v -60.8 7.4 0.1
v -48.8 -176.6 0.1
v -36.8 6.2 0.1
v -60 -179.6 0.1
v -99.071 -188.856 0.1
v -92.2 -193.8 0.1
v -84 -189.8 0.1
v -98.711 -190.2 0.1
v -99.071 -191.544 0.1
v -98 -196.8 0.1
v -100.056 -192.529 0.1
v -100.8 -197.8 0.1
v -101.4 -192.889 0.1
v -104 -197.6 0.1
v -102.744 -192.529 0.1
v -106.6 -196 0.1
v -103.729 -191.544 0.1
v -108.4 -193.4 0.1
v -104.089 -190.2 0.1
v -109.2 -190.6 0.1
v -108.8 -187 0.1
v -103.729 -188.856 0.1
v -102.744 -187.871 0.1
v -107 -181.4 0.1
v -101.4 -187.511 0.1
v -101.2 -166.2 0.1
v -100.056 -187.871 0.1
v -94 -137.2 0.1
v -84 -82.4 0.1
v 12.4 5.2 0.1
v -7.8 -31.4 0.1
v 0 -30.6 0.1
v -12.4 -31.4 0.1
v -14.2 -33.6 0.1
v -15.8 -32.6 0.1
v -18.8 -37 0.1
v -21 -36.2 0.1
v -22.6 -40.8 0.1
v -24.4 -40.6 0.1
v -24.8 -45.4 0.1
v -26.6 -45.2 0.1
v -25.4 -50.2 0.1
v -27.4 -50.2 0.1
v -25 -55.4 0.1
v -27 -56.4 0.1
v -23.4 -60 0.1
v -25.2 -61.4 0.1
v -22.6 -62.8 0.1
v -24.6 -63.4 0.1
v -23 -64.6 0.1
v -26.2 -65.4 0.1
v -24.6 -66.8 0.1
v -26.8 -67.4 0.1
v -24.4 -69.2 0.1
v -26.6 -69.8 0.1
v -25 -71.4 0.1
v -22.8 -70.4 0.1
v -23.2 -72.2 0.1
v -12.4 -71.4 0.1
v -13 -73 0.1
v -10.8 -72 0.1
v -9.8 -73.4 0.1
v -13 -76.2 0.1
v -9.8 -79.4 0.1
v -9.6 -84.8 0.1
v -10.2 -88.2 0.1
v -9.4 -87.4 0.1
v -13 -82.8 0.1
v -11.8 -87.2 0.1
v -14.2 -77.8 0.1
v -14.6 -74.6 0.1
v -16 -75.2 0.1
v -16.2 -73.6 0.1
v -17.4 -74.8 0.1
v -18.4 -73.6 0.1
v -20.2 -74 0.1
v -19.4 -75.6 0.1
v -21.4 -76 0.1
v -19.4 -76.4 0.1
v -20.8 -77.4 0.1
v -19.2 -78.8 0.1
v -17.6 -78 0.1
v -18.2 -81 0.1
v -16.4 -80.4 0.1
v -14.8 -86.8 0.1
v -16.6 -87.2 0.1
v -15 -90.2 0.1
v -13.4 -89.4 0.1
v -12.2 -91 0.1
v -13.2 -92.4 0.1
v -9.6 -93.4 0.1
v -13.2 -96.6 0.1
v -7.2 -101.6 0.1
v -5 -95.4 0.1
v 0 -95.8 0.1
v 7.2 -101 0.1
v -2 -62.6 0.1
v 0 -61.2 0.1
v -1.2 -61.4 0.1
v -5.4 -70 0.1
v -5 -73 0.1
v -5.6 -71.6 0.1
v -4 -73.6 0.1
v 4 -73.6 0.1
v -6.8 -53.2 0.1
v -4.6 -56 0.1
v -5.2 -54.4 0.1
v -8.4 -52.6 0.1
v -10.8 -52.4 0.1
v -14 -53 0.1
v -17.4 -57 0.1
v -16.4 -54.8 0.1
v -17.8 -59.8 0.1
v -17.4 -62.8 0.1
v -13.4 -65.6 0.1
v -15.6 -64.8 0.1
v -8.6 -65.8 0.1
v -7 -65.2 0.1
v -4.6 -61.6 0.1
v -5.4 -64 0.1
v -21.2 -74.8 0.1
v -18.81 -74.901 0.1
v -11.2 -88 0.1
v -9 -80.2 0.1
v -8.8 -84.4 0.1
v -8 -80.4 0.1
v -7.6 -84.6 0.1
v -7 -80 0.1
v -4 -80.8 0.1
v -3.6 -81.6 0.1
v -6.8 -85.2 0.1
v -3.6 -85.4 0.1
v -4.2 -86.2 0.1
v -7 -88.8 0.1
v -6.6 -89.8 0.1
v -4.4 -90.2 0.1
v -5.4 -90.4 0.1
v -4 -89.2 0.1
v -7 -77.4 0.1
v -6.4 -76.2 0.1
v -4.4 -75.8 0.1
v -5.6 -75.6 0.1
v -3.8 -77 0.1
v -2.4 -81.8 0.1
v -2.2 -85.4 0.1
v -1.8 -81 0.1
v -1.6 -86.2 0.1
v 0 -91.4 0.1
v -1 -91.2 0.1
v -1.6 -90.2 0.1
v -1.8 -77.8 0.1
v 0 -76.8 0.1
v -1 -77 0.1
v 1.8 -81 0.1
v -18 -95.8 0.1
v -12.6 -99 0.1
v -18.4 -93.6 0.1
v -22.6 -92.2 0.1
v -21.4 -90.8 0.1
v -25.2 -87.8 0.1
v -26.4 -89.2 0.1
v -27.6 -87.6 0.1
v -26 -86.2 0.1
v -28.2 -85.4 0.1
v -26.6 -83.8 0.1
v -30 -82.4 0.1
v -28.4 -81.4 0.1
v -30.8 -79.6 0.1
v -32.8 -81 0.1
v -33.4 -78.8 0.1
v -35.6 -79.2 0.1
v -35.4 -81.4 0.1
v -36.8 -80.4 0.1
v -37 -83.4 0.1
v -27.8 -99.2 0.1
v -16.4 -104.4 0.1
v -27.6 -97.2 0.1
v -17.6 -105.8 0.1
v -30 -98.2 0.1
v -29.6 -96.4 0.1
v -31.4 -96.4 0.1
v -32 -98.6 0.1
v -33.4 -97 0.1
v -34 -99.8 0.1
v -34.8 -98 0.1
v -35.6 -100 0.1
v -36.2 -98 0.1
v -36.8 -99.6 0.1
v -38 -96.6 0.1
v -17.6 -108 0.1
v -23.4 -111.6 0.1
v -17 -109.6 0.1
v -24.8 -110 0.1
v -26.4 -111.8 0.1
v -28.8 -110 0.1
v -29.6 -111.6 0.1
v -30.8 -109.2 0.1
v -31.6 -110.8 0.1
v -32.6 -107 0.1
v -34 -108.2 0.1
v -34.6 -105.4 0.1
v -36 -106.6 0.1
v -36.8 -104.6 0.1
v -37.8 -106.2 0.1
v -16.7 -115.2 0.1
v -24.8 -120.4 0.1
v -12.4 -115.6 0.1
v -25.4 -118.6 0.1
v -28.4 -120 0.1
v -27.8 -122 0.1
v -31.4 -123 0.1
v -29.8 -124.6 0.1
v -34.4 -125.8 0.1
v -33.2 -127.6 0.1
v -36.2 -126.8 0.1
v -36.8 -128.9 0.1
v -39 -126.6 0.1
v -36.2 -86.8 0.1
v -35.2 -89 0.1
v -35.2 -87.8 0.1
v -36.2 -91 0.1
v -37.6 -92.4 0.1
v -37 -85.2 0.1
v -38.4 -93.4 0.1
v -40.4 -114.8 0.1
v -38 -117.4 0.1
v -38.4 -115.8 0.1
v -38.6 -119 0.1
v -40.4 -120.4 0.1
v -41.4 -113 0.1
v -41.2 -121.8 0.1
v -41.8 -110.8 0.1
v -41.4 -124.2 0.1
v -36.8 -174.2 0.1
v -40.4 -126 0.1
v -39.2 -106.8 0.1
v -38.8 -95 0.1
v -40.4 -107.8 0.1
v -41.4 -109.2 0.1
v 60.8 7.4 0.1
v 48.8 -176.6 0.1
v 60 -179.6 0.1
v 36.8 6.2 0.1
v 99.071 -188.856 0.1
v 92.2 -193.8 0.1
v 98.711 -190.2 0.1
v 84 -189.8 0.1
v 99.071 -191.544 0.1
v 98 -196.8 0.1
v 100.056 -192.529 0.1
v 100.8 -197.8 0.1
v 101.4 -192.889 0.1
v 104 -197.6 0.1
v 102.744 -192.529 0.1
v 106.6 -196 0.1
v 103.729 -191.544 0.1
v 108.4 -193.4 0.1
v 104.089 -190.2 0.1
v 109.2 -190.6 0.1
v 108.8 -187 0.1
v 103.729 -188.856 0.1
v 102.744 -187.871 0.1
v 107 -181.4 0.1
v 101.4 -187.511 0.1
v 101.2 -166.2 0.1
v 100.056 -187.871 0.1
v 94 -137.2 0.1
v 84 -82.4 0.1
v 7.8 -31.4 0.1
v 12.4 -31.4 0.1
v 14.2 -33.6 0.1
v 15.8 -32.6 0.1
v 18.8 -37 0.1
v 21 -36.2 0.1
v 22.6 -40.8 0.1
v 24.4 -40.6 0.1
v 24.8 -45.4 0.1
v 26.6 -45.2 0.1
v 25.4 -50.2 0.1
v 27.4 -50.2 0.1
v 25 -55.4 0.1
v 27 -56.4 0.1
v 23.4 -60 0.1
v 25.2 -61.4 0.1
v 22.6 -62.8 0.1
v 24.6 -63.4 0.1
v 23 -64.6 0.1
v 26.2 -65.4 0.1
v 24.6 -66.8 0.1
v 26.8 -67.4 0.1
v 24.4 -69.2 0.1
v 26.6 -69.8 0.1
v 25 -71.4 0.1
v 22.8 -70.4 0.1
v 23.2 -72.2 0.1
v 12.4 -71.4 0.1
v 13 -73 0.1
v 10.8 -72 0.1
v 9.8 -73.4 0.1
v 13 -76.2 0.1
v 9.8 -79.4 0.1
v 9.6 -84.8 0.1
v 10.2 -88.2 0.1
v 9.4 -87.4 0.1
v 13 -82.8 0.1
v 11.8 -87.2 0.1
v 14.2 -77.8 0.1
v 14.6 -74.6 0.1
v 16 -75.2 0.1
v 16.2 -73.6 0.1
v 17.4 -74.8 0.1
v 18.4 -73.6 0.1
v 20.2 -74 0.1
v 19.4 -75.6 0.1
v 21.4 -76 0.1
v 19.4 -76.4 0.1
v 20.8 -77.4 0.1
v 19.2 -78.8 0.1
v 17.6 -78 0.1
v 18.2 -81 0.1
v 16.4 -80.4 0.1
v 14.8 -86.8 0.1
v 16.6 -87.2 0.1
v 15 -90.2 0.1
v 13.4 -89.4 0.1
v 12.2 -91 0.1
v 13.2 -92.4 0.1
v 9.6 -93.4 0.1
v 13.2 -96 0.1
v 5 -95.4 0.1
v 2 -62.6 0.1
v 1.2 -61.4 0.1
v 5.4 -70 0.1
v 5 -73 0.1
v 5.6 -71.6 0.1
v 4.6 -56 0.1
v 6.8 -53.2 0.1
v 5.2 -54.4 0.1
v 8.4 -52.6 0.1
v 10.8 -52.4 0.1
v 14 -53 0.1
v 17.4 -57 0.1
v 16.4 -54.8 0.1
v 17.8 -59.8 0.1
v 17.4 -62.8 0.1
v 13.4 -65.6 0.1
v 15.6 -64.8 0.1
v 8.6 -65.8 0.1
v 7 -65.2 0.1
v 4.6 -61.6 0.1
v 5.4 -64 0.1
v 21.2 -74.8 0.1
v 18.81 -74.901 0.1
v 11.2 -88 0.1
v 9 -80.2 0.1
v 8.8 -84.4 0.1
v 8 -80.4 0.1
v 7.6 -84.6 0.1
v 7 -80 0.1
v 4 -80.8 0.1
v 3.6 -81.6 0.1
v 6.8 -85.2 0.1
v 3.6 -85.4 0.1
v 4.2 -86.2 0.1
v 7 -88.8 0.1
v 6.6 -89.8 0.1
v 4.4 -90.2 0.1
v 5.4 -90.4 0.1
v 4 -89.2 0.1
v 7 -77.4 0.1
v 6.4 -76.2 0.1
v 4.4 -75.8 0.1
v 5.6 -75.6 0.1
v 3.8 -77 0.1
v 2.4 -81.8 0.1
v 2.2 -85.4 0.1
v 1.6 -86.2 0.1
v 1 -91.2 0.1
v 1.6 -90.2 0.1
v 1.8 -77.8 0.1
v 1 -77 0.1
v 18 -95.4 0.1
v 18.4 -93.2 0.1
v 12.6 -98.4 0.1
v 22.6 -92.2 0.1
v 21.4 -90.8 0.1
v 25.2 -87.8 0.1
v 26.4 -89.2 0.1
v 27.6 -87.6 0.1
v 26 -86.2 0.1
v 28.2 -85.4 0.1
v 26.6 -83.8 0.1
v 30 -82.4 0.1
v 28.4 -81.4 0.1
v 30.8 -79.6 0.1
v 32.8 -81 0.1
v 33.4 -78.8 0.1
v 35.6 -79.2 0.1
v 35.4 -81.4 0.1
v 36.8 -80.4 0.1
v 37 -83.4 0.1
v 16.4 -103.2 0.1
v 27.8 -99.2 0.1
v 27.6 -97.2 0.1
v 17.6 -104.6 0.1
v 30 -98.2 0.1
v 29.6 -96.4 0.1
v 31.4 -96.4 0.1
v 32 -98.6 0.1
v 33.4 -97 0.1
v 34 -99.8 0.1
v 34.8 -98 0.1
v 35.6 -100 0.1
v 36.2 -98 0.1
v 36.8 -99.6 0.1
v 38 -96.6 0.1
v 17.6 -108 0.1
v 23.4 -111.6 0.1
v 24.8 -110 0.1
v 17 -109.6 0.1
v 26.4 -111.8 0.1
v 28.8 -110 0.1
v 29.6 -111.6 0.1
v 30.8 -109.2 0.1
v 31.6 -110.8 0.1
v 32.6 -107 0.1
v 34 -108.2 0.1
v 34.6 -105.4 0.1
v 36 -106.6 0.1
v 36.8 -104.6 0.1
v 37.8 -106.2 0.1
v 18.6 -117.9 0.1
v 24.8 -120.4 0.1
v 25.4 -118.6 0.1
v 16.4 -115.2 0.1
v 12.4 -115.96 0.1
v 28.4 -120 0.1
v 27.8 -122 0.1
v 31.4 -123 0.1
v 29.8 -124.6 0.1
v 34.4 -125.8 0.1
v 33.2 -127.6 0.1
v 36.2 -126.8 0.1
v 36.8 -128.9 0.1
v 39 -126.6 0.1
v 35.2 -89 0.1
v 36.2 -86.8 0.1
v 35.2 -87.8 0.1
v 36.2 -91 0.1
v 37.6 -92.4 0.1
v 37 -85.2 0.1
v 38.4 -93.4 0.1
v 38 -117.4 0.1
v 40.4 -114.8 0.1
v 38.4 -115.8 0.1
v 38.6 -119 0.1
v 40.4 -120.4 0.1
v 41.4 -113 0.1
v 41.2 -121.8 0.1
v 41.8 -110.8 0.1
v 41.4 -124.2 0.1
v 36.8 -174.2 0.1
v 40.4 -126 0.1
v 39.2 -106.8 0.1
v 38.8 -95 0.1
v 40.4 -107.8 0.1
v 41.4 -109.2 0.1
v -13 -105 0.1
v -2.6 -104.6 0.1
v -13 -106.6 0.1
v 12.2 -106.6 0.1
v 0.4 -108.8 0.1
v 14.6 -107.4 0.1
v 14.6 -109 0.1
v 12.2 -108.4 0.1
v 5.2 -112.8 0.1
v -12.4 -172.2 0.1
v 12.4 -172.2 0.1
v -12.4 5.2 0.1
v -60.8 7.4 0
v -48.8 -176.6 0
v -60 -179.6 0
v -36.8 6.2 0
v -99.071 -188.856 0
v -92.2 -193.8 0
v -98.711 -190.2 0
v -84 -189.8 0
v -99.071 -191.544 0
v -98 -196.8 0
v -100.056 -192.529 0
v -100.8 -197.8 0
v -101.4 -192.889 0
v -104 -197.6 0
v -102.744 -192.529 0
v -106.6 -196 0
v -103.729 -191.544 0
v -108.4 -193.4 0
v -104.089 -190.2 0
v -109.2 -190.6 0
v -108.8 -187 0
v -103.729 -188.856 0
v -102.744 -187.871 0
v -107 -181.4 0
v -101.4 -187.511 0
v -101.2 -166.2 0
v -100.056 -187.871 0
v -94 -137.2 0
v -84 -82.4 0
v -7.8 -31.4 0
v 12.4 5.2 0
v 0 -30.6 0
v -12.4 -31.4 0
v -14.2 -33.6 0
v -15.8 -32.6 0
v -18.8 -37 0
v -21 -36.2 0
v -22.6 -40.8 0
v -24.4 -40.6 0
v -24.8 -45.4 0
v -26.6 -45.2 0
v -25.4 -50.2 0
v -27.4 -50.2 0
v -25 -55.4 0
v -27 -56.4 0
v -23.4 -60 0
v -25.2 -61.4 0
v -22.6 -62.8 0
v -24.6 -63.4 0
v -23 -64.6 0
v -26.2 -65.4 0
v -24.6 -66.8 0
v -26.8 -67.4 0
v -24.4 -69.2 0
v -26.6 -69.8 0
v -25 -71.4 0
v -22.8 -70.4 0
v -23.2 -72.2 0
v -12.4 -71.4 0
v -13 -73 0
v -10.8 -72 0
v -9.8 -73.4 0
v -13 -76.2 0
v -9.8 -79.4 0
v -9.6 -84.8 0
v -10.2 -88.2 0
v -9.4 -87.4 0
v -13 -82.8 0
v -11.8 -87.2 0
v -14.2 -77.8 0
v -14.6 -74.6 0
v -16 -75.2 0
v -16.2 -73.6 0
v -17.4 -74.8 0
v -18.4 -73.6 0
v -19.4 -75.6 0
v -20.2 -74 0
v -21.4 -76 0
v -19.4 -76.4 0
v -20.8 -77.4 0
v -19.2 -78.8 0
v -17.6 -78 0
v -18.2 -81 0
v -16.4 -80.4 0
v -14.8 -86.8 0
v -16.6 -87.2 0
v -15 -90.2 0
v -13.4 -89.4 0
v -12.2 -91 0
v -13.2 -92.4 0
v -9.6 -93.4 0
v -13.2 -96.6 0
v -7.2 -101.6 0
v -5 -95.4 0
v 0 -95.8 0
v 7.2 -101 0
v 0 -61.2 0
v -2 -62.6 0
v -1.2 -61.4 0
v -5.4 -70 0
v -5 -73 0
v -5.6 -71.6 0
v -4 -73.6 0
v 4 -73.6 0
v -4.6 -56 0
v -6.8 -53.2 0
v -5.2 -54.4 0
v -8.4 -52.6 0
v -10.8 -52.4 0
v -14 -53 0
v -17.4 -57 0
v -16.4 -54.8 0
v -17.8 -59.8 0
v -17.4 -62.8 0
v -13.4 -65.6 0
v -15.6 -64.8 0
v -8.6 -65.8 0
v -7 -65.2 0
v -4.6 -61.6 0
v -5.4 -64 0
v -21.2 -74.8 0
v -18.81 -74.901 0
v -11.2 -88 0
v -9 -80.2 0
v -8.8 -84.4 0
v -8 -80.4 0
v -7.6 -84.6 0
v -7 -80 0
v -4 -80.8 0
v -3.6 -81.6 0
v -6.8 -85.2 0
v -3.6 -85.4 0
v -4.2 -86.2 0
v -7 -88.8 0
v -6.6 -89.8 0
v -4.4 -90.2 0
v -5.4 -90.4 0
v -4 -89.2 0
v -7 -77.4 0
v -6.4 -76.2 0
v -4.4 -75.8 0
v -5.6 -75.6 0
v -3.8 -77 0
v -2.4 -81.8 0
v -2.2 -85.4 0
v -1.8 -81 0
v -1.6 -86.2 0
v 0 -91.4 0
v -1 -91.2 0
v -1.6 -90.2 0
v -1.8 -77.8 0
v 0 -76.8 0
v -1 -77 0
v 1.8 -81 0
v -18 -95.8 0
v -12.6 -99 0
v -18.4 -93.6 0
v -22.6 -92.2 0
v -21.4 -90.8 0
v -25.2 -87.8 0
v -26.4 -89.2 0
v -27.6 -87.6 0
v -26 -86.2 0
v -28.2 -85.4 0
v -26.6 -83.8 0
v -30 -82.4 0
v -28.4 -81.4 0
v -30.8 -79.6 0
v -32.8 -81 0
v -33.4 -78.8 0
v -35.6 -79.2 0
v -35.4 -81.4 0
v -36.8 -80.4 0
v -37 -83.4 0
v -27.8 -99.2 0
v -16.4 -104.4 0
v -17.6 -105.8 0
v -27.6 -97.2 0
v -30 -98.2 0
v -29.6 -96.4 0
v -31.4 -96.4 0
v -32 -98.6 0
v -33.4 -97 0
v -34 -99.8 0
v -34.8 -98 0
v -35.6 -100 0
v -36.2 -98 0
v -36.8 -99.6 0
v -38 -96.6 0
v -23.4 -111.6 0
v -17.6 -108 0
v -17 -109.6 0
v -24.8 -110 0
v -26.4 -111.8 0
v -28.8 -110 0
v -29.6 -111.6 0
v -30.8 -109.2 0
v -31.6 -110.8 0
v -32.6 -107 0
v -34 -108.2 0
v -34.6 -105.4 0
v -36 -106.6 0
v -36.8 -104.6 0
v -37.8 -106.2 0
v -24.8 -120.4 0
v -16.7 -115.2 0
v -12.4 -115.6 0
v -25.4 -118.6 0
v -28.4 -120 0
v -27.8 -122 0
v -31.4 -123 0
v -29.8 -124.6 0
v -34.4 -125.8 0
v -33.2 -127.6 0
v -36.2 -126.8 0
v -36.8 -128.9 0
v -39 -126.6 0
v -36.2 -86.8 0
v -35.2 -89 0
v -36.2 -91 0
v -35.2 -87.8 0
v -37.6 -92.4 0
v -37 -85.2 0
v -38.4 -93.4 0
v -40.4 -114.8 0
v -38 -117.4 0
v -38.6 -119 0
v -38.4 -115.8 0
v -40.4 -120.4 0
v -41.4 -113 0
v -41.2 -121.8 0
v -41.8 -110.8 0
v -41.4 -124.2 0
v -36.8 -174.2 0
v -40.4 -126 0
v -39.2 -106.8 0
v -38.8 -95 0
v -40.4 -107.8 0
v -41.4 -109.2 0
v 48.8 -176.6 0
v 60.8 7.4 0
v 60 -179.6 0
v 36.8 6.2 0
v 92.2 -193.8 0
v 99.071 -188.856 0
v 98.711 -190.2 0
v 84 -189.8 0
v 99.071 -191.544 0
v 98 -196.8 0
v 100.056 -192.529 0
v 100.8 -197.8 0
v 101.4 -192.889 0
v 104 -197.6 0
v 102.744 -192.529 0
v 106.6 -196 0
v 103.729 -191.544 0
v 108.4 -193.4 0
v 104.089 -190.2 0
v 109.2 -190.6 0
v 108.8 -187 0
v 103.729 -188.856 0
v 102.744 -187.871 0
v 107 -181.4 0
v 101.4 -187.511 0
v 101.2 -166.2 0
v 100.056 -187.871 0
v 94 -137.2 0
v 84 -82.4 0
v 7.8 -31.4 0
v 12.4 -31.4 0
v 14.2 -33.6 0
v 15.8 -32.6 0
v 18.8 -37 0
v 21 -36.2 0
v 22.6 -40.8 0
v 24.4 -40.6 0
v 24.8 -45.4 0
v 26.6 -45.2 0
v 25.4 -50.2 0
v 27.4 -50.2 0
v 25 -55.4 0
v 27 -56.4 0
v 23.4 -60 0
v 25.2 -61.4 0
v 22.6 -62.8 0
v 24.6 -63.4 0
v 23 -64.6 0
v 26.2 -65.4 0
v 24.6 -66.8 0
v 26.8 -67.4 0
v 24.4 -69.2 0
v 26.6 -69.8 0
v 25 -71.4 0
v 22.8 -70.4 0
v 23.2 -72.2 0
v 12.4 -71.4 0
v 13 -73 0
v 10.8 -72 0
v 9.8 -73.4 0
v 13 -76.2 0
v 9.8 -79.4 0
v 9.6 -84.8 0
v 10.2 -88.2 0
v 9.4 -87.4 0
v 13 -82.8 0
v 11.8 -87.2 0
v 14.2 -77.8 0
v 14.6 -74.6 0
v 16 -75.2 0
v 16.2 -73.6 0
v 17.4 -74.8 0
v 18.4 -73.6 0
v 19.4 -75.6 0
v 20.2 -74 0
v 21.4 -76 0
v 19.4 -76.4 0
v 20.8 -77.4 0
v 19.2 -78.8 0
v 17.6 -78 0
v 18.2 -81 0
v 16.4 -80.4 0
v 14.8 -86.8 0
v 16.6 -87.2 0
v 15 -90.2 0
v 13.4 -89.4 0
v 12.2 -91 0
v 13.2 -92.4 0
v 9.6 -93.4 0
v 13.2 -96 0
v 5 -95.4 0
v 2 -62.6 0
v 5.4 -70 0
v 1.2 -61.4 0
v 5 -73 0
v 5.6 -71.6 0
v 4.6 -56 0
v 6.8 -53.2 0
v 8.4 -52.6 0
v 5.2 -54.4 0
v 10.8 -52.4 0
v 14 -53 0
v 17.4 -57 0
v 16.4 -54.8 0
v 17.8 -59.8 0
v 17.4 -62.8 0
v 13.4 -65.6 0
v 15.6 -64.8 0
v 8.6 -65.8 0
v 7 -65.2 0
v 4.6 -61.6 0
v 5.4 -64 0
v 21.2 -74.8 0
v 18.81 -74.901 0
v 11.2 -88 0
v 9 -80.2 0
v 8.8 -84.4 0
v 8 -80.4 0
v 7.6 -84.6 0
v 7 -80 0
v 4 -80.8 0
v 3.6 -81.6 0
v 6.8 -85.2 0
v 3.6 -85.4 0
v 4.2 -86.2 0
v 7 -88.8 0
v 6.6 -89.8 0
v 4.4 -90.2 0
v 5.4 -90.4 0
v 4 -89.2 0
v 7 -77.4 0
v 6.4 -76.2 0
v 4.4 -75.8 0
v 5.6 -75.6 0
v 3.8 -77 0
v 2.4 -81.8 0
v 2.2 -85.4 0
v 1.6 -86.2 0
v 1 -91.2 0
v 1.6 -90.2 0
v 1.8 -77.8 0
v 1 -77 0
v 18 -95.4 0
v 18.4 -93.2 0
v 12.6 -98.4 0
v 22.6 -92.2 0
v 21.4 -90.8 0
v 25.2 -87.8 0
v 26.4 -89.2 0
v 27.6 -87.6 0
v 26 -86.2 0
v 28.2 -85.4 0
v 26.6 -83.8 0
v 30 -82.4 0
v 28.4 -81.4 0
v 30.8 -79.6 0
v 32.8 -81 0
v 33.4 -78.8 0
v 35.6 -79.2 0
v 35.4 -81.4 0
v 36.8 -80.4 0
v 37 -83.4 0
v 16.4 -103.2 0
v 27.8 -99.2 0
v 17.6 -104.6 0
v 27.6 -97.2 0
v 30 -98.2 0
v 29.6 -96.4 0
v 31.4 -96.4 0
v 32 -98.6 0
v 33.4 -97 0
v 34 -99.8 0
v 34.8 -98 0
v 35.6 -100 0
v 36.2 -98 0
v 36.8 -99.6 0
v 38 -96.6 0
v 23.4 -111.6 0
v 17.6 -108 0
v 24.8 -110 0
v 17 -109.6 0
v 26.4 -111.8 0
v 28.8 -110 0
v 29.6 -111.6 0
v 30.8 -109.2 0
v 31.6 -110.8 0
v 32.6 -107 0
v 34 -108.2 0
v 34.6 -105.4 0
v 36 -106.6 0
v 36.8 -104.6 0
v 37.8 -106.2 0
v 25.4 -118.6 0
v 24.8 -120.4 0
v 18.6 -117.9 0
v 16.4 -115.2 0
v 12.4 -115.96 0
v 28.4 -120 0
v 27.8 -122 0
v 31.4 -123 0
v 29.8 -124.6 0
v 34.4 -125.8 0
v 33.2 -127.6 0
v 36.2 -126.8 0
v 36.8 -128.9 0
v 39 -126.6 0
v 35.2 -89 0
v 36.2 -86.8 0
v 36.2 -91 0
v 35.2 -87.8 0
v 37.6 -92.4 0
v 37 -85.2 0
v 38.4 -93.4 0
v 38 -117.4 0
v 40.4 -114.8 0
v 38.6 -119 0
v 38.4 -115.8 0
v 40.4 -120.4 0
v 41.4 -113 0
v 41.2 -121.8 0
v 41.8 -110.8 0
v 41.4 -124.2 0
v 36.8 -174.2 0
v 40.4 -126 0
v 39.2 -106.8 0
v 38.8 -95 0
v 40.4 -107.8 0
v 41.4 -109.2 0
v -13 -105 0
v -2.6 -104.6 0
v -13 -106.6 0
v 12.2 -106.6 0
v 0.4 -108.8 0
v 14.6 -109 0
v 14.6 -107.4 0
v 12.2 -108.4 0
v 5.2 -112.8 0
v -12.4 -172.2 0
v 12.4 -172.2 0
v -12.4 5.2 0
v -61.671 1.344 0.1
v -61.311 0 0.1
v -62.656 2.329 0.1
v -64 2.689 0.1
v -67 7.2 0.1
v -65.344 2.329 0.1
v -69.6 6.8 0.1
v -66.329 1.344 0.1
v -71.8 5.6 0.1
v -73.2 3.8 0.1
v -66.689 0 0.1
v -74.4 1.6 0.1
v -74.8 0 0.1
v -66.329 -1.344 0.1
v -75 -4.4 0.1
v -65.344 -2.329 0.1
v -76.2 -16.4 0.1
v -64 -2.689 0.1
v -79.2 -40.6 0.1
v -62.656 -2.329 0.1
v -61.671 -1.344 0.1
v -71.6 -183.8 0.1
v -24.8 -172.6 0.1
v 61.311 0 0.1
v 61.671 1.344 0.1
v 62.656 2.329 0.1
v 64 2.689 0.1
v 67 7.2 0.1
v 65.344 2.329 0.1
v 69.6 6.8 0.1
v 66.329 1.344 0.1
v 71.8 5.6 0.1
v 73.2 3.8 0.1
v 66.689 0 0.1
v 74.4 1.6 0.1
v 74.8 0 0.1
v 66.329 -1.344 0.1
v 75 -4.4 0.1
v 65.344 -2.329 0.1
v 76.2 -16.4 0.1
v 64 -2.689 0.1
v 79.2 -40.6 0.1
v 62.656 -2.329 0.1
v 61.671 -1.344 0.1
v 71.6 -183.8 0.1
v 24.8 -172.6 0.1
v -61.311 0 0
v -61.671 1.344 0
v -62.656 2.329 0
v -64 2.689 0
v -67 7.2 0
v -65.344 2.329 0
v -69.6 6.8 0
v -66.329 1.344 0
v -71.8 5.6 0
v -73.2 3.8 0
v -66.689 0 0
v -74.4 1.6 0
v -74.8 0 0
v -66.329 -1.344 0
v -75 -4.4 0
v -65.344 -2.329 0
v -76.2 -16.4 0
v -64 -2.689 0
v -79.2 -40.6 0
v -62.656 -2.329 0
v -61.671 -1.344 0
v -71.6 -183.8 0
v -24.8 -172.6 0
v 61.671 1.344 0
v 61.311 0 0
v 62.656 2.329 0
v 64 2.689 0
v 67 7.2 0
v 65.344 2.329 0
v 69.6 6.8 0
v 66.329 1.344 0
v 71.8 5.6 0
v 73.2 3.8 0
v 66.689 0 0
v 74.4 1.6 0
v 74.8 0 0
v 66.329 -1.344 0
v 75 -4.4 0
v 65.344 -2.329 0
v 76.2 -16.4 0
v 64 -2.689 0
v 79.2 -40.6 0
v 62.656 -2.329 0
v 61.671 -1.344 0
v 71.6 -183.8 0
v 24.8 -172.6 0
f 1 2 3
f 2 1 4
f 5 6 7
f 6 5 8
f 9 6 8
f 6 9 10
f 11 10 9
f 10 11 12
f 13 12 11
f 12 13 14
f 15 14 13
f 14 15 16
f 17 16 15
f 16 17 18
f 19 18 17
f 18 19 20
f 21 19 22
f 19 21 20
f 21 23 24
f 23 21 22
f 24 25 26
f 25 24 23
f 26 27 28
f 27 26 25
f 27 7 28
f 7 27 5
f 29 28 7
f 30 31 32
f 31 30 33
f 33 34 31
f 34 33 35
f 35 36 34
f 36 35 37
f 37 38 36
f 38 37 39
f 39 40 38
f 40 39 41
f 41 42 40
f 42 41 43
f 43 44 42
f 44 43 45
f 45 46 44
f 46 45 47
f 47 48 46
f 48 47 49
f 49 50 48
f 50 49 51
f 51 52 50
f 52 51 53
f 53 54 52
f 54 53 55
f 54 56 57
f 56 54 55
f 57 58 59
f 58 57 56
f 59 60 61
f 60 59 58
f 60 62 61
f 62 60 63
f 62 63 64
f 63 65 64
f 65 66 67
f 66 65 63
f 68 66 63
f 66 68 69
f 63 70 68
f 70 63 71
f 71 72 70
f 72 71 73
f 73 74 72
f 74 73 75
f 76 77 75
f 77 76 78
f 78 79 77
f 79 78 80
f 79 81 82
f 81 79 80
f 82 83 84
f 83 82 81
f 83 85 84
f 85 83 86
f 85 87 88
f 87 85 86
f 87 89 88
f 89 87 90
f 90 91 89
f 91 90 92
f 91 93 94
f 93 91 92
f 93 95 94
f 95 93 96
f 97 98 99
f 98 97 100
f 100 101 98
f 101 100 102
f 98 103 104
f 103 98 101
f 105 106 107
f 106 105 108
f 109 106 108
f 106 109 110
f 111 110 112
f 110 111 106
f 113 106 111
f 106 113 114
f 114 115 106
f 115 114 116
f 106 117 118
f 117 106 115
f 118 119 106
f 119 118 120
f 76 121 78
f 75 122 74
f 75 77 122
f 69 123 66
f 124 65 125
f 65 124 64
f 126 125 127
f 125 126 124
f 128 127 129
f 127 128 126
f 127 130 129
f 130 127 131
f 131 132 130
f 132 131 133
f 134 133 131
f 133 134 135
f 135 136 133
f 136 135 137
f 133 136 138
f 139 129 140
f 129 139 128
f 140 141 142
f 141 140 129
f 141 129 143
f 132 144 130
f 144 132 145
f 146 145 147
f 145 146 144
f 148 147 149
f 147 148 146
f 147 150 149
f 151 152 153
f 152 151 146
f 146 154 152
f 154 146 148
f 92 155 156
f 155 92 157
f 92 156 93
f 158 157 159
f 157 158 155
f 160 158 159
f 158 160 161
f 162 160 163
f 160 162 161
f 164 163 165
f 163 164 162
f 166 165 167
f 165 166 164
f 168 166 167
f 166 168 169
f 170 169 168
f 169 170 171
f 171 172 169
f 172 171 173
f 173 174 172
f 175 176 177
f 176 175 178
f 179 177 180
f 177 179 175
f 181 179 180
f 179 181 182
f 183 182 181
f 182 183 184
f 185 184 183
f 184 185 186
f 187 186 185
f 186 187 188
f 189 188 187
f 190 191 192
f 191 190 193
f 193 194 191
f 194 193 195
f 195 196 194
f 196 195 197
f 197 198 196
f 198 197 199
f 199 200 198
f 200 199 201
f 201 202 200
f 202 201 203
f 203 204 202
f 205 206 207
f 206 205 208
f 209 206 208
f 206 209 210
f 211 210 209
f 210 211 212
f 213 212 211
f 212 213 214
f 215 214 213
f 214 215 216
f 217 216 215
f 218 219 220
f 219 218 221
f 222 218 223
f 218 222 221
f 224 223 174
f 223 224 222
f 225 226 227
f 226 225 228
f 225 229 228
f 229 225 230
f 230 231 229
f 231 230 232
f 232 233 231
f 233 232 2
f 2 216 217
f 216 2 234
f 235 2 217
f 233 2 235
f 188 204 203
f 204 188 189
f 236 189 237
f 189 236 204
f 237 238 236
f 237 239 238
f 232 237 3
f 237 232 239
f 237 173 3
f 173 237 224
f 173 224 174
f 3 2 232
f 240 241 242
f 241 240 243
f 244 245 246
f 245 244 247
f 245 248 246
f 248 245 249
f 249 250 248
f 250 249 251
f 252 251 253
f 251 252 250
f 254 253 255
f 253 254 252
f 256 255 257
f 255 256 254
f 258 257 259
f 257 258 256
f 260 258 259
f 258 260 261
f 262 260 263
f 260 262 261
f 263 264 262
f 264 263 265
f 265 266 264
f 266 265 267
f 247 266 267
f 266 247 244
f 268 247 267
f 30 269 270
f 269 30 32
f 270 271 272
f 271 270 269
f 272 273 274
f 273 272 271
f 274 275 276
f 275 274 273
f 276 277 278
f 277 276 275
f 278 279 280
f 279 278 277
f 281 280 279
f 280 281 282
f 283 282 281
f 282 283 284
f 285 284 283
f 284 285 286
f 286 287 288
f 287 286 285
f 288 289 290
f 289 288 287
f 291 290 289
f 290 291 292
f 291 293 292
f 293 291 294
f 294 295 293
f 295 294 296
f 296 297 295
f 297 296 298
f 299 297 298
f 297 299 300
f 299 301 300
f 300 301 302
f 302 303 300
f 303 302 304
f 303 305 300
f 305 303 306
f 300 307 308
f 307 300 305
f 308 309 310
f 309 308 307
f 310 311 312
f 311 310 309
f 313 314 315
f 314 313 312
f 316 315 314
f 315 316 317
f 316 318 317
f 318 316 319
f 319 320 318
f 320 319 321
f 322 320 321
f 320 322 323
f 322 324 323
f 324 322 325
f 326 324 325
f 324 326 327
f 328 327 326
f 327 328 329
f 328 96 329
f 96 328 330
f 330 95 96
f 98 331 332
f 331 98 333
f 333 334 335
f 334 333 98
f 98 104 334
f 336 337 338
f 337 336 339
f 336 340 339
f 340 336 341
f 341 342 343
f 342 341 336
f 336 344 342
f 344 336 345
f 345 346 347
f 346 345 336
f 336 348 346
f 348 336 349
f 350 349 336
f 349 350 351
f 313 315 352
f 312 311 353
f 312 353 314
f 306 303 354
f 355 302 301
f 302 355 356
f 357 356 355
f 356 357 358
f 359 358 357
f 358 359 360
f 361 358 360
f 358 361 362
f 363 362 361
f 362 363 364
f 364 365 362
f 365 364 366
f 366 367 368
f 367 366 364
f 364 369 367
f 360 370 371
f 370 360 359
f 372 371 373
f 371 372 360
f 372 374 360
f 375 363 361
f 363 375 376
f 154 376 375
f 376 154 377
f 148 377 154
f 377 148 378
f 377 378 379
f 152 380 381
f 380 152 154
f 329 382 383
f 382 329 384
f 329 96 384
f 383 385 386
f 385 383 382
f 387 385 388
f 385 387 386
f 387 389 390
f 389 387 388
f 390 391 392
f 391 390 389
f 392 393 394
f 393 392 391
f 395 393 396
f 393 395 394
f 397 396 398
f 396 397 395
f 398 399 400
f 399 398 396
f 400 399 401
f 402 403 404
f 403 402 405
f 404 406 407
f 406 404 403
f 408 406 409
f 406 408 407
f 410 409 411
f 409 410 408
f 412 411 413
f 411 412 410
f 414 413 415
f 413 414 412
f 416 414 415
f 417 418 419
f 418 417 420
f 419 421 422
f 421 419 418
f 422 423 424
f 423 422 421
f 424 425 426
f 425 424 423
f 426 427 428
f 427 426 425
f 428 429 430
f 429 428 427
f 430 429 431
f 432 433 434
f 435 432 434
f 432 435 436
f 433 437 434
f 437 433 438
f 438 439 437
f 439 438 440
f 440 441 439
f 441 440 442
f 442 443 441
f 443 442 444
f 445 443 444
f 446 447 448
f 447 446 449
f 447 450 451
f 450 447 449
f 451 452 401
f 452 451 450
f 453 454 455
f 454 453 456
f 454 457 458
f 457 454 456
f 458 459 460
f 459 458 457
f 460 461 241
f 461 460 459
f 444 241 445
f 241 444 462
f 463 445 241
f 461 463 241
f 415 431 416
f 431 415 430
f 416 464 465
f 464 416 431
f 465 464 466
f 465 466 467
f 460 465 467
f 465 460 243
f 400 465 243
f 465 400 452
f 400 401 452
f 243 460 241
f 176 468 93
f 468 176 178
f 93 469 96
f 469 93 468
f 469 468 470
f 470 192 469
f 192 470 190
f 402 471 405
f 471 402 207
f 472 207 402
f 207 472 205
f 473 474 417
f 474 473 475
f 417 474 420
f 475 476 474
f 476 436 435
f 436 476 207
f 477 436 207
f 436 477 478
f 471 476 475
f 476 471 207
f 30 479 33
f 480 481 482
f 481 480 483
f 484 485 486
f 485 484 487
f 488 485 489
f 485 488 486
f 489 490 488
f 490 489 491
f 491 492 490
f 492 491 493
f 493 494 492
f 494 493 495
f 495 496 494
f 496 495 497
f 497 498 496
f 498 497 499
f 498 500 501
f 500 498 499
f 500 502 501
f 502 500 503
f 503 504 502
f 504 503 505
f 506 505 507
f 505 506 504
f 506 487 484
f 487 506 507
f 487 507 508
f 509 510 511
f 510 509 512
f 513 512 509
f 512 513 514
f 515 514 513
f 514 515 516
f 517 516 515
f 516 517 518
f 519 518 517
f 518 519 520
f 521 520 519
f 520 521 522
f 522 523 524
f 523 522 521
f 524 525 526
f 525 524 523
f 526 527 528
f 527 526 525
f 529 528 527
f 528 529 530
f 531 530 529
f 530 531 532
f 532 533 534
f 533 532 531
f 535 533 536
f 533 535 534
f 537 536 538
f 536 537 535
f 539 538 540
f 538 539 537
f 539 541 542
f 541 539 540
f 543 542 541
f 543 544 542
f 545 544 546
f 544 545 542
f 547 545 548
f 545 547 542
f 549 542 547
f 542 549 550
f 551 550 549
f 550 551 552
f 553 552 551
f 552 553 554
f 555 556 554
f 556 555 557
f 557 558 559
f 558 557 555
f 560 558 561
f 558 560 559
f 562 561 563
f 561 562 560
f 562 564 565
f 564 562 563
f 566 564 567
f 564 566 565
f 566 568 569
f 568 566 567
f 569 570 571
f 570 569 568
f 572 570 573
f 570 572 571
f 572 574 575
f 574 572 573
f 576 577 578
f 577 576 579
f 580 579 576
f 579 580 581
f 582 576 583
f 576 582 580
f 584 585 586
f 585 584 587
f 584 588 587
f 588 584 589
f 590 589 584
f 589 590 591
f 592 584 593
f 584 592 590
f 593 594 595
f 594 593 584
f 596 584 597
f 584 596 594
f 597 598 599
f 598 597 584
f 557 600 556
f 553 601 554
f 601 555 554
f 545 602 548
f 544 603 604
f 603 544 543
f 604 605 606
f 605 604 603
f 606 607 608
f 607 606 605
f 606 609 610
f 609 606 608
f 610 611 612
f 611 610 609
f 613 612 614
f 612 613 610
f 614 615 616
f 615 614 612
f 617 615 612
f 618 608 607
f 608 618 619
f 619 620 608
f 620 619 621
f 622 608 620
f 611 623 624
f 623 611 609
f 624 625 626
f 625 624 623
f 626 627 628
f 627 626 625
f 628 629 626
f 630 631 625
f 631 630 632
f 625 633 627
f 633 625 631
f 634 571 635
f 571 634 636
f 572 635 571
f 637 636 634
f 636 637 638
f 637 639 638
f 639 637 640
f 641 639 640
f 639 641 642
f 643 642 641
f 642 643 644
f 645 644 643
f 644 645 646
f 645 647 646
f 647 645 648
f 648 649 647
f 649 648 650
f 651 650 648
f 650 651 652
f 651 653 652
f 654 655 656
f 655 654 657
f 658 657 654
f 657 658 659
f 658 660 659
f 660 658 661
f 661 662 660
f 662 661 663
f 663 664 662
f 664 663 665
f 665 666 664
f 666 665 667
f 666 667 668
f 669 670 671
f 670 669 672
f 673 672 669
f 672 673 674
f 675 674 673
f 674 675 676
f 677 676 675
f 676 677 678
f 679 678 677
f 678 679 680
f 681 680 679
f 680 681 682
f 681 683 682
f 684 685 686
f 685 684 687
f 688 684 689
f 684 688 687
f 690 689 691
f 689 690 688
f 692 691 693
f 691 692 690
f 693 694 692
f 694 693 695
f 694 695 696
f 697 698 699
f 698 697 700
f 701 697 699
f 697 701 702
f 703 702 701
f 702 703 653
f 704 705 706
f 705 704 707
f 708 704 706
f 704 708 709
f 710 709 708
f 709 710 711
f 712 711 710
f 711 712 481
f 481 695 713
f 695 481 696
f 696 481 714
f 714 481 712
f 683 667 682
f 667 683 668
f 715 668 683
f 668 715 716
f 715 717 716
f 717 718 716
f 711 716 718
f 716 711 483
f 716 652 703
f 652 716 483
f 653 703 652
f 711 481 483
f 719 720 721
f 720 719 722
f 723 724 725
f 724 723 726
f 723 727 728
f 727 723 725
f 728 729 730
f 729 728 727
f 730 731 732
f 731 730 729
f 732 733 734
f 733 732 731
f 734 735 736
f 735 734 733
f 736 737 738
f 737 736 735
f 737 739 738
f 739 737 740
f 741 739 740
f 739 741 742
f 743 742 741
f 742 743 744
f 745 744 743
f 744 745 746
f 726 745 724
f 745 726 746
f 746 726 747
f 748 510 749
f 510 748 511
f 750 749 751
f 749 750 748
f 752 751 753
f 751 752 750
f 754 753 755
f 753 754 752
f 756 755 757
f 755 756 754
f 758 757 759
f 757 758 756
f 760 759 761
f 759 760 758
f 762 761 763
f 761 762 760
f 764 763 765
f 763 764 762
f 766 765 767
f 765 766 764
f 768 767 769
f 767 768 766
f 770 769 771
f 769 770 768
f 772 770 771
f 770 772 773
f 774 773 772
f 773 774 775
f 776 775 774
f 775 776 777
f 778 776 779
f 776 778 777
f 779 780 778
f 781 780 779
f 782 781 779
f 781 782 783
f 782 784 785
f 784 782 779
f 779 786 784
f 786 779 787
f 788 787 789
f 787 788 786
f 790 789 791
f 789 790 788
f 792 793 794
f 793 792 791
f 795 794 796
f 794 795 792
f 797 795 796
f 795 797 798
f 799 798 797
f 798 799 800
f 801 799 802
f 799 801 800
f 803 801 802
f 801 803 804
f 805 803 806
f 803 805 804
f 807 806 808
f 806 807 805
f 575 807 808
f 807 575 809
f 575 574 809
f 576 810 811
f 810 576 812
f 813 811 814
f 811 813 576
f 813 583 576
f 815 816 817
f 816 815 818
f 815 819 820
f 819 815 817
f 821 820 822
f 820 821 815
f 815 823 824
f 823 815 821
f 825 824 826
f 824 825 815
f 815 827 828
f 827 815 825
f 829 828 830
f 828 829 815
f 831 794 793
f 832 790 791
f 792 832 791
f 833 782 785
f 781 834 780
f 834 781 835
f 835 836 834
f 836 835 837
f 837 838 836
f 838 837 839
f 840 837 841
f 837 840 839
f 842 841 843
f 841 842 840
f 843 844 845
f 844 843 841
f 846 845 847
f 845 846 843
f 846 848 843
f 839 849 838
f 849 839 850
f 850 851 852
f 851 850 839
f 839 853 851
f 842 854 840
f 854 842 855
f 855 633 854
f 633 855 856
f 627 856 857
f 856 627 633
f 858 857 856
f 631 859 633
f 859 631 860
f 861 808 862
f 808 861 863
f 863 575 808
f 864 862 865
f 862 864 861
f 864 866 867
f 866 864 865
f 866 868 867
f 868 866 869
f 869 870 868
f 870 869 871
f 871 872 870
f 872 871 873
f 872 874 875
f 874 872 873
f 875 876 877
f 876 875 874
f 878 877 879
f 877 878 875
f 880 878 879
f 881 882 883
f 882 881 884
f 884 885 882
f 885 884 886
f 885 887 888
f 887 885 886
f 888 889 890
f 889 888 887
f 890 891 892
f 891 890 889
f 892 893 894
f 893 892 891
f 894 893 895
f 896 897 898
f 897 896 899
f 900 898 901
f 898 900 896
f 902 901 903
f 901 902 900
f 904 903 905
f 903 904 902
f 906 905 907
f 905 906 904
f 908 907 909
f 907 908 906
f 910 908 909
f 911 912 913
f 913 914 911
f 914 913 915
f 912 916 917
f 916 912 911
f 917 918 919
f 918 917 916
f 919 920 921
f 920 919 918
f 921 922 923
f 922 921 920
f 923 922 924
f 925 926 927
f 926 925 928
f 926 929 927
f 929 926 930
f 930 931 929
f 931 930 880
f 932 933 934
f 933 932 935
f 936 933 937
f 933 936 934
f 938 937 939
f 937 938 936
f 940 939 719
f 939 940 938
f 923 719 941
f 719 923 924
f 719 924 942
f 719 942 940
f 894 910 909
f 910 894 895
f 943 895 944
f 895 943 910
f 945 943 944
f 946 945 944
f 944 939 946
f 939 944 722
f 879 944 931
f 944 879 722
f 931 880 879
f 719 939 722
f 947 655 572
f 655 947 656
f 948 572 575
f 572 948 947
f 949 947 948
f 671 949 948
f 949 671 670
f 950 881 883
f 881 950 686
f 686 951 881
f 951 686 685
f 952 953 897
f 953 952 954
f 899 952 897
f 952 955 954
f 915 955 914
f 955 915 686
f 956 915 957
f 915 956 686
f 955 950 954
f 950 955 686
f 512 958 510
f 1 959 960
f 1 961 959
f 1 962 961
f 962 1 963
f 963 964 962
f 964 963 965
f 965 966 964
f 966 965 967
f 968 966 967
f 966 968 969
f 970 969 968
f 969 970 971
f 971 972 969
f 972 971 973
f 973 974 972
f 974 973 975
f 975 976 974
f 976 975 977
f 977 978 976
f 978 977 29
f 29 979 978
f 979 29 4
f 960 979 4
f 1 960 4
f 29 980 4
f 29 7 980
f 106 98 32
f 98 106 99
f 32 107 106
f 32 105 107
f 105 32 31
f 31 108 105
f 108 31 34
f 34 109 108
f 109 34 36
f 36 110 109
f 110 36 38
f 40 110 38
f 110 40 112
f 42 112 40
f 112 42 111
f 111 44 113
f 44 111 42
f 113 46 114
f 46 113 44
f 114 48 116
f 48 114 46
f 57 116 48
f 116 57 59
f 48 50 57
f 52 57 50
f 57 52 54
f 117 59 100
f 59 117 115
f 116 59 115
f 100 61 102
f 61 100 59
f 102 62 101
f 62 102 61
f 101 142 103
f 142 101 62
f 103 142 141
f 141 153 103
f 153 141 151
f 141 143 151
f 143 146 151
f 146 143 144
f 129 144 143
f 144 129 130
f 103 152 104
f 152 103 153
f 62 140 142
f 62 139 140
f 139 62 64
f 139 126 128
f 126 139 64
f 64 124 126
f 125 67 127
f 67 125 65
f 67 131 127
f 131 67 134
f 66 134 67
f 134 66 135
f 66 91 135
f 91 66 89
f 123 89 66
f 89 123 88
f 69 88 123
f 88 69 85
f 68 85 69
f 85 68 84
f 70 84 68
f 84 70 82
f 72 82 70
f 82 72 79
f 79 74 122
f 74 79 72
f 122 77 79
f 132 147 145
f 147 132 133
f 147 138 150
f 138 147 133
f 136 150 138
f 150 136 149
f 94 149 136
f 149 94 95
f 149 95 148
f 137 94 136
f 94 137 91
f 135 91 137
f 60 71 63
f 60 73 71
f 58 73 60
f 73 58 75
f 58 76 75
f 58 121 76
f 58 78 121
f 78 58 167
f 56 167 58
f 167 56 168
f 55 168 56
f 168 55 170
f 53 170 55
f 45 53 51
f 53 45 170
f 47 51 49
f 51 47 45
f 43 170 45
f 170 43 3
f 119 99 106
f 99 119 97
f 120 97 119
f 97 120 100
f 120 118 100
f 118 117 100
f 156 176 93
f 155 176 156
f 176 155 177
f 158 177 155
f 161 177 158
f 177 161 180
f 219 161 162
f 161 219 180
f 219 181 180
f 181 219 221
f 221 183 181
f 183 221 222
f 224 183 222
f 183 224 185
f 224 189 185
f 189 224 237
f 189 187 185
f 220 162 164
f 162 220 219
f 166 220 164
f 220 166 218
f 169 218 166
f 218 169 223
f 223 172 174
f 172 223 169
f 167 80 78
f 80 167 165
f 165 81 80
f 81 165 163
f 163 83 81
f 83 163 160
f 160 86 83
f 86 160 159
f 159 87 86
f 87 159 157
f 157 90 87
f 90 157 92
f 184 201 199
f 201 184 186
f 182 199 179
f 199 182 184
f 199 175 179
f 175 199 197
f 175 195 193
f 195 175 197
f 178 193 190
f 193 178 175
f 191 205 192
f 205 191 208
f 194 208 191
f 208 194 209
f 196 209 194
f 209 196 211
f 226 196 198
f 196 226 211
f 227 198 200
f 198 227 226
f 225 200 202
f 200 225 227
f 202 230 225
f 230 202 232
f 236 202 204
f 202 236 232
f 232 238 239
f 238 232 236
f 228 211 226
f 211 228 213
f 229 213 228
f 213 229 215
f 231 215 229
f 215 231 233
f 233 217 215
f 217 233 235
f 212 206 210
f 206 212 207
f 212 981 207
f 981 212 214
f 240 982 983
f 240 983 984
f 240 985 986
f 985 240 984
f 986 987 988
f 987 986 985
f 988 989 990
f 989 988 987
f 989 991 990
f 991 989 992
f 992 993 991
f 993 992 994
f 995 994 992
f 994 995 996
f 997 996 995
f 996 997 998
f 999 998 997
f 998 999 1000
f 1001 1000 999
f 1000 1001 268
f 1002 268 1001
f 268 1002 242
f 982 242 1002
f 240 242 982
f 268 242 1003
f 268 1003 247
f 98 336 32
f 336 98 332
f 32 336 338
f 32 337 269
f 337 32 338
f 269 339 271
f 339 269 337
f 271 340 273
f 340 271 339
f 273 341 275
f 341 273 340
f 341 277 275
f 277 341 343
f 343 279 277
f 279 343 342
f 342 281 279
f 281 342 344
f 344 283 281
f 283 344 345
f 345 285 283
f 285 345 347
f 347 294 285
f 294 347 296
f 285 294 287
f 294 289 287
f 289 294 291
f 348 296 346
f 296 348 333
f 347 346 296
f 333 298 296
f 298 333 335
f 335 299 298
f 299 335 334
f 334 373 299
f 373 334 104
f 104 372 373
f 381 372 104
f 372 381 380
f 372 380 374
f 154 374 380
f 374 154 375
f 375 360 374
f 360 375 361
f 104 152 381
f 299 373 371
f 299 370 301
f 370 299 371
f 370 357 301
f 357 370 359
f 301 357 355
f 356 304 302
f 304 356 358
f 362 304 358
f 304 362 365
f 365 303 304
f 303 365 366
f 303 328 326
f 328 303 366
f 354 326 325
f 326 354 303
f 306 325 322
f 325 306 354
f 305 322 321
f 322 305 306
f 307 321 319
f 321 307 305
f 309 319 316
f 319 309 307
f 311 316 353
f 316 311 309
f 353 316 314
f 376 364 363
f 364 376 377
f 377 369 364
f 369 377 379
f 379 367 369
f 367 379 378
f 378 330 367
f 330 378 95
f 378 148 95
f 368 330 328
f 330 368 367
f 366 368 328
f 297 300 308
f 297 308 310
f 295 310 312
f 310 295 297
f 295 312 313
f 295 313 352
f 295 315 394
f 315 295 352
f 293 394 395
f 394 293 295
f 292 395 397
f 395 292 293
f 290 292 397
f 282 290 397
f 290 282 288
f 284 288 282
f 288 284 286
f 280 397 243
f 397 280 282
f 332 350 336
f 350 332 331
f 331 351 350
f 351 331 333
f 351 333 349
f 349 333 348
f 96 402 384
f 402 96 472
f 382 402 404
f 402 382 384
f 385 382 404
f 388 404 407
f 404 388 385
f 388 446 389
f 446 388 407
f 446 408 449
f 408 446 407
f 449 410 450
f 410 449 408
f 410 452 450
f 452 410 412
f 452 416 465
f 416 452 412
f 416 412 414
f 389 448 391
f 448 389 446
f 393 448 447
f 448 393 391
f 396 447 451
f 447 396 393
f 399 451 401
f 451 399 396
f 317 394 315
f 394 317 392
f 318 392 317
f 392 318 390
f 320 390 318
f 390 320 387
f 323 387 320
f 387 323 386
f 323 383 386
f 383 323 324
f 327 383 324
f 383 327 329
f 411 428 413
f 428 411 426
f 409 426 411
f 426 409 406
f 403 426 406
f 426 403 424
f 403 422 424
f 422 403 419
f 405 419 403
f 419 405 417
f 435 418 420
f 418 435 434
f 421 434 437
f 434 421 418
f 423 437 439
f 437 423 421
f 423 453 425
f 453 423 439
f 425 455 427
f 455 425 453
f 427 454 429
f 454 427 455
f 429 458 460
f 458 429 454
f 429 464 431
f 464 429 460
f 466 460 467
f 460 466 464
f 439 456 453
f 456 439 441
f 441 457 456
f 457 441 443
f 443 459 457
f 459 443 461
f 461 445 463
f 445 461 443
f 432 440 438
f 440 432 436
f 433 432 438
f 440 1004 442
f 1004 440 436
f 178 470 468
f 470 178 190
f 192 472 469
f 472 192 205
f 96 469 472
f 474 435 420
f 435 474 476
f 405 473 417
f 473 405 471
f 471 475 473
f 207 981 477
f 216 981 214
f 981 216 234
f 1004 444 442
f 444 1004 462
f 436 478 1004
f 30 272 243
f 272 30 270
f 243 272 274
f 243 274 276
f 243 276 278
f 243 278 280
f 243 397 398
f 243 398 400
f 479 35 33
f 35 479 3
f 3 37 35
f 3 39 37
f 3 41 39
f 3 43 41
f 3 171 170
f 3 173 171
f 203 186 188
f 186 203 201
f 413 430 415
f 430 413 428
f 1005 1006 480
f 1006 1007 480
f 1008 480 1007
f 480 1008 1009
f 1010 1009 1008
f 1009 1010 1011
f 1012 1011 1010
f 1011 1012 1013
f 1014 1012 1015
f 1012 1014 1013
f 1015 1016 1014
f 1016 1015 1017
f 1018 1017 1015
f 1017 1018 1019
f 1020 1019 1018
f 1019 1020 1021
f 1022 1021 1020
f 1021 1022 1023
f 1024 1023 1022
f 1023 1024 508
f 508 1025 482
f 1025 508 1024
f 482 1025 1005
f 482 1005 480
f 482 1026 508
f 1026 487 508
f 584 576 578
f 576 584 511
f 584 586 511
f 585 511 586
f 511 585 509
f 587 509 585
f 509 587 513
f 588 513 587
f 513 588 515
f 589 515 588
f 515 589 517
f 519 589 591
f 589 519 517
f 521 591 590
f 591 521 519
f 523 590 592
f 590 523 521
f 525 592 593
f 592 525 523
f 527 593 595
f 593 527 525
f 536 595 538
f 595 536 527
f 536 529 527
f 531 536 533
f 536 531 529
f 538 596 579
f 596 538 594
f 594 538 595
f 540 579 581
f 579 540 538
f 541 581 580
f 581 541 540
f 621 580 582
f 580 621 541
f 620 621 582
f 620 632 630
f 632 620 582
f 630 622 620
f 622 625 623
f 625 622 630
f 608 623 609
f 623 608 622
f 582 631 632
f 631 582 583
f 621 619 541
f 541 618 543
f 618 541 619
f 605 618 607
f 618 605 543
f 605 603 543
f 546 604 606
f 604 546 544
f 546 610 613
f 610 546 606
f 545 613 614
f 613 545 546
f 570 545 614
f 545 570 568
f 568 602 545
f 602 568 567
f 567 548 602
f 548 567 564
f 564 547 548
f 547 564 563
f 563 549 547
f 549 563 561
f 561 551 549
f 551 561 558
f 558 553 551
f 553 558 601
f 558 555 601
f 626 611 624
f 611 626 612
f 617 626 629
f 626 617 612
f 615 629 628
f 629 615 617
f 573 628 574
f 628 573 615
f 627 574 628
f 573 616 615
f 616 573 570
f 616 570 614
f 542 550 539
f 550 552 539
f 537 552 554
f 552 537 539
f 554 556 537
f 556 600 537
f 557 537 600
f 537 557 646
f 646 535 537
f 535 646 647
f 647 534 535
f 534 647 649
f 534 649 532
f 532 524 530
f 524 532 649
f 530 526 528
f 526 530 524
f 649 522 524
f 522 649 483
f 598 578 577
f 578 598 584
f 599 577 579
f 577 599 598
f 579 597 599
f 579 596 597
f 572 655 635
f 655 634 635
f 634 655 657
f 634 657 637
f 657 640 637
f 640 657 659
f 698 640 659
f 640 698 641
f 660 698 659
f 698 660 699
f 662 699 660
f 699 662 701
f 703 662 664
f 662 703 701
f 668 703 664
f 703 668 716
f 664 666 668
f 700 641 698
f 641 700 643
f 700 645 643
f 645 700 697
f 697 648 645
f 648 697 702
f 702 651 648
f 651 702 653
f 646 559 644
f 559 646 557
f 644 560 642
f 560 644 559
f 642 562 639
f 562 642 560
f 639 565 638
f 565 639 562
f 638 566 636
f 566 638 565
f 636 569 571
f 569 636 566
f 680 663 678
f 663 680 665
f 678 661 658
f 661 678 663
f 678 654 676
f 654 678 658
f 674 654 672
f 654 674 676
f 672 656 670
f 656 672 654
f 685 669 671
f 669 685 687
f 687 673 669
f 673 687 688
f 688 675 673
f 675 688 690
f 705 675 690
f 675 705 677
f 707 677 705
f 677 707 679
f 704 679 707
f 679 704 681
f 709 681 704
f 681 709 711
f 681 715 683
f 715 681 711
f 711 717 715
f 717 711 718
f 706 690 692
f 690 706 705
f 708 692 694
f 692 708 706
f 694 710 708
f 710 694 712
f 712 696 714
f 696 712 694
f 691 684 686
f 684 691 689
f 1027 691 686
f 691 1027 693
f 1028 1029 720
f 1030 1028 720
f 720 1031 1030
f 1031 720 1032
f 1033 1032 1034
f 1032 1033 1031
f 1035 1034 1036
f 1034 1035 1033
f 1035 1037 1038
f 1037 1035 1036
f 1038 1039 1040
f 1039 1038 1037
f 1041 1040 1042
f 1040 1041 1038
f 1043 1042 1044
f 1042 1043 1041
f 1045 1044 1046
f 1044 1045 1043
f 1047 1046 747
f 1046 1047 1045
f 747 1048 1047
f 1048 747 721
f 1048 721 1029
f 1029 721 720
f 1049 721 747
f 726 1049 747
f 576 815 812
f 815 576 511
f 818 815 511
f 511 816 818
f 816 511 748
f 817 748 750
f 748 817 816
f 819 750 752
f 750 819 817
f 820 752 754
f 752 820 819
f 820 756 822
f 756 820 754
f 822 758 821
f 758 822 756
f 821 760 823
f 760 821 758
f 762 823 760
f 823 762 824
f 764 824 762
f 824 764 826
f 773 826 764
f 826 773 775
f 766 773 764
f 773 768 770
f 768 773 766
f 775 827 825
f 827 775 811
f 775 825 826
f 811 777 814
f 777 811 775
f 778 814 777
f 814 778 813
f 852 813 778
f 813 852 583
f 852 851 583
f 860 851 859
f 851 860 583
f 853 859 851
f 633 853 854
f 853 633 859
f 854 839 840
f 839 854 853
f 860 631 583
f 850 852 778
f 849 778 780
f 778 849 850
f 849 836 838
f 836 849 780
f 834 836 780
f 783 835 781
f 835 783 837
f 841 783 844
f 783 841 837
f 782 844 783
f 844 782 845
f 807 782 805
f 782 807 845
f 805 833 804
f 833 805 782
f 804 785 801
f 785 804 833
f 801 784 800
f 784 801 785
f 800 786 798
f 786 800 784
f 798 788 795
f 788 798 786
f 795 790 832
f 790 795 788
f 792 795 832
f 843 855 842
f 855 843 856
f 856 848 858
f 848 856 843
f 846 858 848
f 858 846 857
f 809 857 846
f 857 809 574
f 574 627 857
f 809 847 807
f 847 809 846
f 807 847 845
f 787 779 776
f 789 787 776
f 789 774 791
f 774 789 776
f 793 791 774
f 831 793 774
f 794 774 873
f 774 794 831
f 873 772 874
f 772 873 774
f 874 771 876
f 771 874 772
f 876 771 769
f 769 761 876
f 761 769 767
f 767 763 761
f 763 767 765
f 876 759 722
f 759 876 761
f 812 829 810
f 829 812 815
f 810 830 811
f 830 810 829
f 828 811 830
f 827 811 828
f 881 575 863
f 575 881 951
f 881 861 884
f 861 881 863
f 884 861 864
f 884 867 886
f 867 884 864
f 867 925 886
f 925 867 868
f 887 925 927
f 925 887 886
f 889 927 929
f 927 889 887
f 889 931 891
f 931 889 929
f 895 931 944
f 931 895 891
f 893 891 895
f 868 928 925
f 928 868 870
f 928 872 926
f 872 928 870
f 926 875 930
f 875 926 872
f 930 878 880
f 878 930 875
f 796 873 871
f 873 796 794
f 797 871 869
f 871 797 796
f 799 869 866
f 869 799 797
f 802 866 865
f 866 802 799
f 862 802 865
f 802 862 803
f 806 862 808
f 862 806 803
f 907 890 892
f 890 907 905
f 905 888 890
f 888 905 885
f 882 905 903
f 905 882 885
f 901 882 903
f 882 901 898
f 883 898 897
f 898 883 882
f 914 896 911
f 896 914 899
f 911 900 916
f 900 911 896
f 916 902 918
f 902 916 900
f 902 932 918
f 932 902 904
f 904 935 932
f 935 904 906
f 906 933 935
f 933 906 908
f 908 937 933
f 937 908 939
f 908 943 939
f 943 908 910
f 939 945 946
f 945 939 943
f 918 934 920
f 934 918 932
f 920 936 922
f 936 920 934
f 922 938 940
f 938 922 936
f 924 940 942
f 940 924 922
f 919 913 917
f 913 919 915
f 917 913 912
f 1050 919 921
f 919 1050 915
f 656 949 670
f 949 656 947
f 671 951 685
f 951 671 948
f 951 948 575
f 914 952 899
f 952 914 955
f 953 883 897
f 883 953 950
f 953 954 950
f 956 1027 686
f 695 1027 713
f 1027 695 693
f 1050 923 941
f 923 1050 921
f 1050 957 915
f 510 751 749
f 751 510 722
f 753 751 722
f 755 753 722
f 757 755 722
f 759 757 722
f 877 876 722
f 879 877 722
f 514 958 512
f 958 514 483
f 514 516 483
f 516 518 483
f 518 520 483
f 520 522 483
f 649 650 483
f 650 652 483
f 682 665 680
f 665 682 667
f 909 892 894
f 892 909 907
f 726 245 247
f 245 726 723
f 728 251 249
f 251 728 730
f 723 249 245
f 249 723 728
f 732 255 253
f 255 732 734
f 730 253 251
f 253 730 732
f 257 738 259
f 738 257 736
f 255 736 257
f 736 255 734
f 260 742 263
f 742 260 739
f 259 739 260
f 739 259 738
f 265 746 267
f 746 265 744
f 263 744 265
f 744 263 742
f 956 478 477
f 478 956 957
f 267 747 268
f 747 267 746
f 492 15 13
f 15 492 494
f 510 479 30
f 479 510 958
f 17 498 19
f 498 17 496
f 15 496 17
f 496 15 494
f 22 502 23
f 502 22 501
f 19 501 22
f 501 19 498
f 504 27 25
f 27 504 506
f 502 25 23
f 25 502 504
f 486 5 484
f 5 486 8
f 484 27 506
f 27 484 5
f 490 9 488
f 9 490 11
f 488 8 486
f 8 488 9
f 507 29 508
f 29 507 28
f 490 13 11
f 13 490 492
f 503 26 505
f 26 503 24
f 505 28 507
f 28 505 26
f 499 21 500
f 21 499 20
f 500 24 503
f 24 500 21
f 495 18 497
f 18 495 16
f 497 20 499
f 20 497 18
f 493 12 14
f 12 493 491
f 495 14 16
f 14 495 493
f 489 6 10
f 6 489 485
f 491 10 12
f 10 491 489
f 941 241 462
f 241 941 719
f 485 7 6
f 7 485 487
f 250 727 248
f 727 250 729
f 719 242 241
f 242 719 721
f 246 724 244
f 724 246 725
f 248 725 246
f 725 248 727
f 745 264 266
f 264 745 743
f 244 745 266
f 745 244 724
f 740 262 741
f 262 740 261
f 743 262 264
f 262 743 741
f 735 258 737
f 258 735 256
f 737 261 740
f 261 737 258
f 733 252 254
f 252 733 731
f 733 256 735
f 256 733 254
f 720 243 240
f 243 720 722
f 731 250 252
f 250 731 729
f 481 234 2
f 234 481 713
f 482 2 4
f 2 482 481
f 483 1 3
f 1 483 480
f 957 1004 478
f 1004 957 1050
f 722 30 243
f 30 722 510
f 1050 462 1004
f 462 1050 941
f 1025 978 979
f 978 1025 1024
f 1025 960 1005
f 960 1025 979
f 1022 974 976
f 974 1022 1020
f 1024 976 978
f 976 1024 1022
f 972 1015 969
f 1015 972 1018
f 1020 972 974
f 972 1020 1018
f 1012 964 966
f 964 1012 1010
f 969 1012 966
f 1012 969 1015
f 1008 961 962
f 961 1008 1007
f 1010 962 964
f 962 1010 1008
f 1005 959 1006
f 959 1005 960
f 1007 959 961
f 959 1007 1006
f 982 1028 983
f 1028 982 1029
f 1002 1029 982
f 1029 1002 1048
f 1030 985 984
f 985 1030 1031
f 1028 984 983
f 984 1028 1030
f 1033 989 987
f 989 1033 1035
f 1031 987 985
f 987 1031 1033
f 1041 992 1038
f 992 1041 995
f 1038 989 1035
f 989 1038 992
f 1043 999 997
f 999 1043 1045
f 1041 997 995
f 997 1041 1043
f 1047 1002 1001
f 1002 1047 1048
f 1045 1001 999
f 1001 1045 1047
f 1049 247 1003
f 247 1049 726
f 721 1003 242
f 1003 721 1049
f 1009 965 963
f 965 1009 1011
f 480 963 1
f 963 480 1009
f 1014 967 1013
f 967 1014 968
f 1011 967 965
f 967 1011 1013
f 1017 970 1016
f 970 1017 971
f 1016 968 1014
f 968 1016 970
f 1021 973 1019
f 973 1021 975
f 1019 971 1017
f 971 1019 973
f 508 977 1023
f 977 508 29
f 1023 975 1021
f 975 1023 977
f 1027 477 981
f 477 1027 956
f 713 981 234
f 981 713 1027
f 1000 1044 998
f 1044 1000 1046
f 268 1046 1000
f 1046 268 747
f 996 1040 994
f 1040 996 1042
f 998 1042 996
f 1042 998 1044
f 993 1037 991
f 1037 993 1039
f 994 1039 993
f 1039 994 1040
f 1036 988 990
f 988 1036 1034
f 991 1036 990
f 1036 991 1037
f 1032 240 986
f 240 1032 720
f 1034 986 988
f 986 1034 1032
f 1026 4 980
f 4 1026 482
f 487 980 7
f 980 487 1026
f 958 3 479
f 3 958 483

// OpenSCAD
use <../lib.scad>
use <s/u9499s01.scad>
use <s/u9499s02.scad>
use <s/u9499s03.scad>
use <s/u9499s04.scad>
function ldraw_lib__u9499() = [
// 0 Sheet Fabric 25 x 25 Square Sail
// 0 Name: u9499.dat
// 0 Author: Philippe Hurbain [Philo]
// 0 !LDRAW_ORG Part UPDATE 2022-03
// 0 !LICENSE Licensed under CC BY 2.0 and CC BY 4.0 : see CAreadme.txt
// 
// 0 BFC CERTIFY CCW
  [0,"BFC","CERTIFY"],
  [0,"BFC","CCW"],
// 
// 0 !CATEGORY Sheet Fabric
// 
// 0 !HISTORY 2022-05-07 [PTadmin] Official Update 2022-03
// 
// 
// 1 16 0 -0.25 0 1 0 0 0 1 0 0 0 1 s\u9499s01.dat
  [1,16,0,-0.25,0,1,0,0,0,1,0,0,0,1, ldraw_lib__s__u9499s01()],
// 1 16 0 0 0 1 0 0 0 -1 0 0 0 1 s\u9499s01.dat
  [1,16,0,0,0,1,0,0,0,-1,0,0,0,1, ldraw_lib__s__u9499s01()],
// 
// 1 16 0 -0.25 0 1 0 0 0 1 0 0 0 1 s\u9499s02.dat
  [1,16,0,-0.25,0,1,0,0,0,1,0,0,0,1, ldraw_lib__s__u9499s02()],
// 1 16 0 0 0 1 0 0 0 -1 0 0 0 1 s\u9499s02.dat
  [1,16,0,0,0,1,0,0,0,-1,0,0,0,1, ldraw_lib__s__u9499s02()],
// 
// 1 16 0 0 0 1 0 0 0 1 0 0 0 1 s\u9499s03.dat
  [1,16,0,0,0,1,0,0,0,1,0,0,0,1, ldraw_lib__s__u9499s03()],
// 
// 1 16 0 0 0 1 0 0 0 1 0 0 0 1 s\u9499s04.dat
  [1,16,0,0,0,1,0,0,0,1,0,0,0,1, ldraw_lib__s__u9499s04()],
];
module ldraw_lib__u9499(step=0, col=false, unit=2/5, alt=false, line=0.2, solid=!$preview)
    makepoly(ldraw_lib__u9499(), step=step, col=col, unit=unit, alt=alt, line=line, solid=solid);
ldraw_lib__u9499(line=0.2);
